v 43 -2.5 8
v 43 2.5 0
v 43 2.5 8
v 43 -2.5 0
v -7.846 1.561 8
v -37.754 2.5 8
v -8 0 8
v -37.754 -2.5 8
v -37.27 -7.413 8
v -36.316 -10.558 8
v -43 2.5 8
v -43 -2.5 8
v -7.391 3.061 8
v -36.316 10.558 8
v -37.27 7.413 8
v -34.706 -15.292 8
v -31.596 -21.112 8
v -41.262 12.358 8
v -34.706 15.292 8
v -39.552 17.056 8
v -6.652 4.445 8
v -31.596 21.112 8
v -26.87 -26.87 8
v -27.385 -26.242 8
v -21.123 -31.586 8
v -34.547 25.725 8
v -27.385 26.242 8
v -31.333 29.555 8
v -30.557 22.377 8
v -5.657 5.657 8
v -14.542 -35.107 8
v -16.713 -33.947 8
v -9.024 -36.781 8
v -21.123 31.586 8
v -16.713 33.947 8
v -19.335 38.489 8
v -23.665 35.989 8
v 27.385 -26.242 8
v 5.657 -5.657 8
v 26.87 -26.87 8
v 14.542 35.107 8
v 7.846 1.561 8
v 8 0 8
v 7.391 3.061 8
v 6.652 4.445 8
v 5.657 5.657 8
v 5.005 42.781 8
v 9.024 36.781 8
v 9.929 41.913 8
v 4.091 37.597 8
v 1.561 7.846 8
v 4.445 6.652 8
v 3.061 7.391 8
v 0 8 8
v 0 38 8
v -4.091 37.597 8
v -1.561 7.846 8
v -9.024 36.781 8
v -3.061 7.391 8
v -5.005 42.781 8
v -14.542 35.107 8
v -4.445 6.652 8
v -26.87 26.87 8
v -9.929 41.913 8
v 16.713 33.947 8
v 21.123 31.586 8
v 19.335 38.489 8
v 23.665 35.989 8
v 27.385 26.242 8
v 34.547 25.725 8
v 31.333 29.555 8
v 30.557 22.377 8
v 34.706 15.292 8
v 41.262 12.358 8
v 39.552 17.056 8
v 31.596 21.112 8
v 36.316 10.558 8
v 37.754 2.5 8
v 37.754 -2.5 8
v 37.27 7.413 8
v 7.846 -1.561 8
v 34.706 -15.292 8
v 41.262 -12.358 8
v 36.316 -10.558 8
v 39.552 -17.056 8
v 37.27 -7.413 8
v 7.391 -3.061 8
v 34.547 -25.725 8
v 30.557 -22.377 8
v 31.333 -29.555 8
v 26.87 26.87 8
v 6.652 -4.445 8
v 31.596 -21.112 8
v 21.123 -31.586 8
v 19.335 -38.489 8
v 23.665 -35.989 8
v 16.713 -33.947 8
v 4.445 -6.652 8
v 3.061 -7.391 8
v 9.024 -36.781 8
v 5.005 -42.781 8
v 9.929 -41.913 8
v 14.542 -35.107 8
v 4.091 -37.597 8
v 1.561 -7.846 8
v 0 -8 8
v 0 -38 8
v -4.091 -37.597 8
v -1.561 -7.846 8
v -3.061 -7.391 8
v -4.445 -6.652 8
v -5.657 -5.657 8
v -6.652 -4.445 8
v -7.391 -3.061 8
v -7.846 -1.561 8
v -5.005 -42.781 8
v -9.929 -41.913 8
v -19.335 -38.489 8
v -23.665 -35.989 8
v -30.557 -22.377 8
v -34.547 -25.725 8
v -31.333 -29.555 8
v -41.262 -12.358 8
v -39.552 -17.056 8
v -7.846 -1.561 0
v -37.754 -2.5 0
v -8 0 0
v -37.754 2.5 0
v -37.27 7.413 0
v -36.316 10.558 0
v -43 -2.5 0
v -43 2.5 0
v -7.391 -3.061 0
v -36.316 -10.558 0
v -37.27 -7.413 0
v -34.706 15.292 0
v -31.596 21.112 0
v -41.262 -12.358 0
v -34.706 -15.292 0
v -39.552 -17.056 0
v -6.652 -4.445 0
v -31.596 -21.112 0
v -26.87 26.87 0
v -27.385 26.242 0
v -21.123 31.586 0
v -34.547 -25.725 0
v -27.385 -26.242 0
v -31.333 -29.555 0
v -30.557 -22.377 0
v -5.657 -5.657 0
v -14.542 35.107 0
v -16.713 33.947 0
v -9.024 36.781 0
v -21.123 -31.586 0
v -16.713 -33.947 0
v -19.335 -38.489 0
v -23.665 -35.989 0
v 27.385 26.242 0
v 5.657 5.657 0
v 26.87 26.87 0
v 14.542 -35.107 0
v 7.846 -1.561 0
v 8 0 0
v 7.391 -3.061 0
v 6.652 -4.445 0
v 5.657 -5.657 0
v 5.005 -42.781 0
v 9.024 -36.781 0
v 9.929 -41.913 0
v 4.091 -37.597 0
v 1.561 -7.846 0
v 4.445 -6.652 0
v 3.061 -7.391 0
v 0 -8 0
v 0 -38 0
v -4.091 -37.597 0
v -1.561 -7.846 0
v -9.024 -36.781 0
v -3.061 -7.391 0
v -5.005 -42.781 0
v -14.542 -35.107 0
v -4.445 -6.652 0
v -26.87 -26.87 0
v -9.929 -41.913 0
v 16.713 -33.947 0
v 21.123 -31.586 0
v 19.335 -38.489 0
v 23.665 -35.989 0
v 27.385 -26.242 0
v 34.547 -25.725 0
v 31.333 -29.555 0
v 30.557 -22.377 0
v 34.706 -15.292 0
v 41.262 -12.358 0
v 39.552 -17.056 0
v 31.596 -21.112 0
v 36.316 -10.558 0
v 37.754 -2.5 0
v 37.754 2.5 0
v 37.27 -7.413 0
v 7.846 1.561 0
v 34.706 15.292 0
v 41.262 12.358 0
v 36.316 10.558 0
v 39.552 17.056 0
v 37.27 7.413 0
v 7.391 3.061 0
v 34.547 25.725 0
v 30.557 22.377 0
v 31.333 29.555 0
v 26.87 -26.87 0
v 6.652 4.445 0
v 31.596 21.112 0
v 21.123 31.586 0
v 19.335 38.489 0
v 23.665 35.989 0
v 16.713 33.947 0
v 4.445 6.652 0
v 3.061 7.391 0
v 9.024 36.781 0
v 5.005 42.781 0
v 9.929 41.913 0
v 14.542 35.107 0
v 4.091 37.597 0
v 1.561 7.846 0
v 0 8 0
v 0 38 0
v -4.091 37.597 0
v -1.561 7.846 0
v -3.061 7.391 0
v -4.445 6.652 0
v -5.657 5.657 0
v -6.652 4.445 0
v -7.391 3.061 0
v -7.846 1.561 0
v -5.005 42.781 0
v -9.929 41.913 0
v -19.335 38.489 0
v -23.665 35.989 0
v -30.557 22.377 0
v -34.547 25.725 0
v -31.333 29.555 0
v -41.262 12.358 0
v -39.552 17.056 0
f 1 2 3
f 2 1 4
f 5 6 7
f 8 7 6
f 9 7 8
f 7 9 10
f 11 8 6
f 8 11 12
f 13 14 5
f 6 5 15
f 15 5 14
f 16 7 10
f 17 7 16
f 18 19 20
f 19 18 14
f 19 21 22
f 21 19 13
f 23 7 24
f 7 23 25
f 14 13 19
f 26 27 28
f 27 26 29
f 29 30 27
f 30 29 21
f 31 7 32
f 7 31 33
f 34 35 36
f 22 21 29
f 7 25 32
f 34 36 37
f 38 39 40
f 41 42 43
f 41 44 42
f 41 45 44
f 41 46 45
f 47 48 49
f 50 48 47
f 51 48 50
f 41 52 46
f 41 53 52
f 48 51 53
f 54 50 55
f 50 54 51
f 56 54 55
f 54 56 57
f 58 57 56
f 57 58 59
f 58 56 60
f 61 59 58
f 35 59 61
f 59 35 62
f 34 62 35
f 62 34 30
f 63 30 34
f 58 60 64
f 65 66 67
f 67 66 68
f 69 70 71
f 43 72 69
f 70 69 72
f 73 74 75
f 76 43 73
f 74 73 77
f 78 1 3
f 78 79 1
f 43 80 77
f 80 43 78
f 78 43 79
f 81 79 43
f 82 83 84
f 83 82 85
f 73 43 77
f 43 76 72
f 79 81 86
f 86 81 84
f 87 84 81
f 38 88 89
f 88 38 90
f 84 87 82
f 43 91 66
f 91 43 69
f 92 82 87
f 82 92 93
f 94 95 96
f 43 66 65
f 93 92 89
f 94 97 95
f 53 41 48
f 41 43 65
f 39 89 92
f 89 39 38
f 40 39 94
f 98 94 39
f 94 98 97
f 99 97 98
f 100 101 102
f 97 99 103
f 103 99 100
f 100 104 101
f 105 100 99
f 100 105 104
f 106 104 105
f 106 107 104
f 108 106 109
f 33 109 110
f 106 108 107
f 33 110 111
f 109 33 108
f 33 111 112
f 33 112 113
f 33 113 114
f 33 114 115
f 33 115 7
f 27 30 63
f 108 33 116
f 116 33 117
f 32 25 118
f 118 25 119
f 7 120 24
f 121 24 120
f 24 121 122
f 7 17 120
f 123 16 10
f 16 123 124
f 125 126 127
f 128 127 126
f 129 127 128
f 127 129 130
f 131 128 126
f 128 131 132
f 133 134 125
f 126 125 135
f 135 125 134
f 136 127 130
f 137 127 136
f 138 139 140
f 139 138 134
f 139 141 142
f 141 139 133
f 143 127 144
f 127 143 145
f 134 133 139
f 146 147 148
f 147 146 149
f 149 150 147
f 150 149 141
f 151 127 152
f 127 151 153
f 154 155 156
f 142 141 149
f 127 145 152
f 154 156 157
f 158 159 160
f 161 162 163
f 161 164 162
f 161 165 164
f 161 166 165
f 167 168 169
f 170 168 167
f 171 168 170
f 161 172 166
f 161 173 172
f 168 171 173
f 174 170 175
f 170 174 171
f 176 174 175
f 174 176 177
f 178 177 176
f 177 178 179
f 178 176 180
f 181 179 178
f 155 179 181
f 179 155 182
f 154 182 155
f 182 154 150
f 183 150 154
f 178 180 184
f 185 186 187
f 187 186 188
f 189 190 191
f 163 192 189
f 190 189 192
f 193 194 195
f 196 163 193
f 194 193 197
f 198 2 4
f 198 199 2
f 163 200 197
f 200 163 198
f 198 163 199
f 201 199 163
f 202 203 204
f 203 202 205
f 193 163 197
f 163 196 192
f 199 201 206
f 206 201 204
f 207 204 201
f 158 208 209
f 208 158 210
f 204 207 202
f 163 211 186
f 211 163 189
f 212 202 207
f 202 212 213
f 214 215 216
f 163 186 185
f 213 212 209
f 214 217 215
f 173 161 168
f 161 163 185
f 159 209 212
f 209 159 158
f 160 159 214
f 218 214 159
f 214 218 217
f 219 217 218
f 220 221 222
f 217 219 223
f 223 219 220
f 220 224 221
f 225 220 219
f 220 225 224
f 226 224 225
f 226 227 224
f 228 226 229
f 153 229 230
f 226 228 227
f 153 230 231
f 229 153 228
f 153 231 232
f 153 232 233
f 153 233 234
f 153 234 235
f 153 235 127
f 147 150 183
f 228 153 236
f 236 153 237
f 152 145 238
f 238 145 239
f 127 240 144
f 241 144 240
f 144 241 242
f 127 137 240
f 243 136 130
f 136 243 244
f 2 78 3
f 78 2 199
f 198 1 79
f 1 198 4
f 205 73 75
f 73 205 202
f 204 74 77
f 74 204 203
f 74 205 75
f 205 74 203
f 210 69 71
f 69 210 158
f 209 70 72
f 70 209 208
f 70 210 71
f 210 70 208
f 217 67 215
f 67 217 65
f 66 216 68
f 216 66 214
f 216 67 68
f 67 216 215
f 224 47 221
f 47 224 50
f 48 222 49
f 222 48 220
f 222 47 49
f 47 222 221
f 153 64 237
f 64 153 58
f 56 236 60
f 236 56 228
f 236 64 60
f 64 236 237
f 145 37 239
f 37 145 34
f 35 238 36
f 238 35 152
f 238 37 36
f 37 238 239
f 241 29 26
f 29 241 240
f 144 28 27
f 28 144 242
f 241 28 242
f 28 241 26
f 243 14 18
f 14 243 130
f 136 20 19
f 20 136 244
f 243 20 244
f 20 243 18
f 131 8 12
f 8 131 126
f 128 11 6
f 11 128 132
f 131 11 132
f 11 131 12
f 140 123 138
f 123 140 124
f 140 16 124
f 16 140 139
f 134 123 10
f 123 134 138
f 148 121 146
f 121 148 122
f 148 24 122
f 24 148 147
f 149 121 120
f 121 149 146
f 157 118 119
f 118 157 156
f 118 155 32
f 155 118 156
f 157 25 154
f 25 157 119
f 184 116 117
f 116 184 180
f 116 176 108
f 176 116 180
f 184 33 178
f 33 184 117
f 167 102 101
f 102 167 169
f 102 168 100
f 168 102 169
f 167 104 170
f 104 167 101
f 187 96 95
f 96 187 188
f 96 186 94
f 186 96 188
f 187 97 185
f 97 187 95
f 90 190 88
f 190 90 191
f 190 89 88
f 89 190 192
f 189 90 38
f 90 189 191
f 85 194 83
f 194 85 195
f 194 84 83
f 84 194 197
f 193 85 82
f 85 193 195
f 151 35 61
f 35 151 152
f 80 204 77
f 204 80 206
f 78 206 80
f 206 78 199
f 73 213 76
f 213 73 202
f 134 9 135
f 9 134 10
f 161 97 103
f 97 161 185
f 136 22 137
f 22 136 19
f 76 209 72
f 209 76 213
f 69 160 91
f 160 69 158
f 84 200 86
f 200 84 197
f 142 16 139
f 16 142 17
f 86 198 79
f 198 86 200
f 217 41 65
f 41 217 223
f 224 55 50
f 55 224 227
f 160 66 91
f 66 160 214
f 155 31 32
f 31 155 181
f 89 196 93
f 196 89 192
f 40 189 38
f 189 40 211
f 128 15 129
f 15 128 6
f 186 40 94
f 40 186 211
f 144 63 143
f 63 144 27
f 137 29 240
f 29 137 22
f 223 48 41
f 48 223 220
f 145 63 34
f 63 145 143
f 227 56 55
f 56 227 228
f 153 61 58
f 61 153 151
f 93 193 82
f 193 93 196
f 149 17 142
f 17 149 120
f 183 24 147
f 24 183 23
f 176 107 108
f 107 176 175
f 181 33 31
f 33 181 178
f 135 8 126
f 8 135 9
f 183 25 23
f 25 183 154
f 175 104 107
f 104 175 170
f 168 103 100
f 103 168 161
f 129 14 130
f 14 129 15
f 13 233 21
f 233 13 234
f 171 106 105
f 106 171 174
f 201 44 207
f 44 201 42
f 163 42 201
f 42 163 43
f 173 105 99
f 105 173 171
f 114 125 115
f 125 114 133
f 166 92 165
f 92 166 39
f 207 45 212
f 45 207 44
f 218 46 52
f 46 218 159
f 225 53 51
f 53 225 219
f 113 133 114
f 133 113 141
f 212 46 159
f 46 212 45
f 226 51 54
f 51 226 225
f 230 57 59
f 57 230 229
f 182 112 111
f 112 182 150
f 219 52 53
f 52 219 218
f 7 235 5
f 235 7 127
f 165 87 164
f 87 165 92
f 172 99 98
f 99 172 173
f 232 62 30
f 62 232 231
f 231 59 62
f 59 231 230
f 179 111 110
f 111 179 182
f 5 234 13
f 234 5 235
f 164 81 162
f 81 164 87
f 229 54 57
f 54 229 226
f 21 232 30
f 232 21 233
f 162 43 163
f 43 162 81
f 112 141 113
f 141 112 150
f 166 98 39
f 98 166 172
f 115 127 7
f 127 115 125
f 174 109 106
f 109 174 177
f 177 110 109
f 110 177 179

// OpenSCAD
$fn = 32;

// ----------------------------------------------------------------------
// Spur blank: bored gear blank
// ----------------------------------------------------------------------

// --- parameters (mm) ---
disc_r = 38;              // blank root radius
disc_t = 8;               // blank thickness
n_teeth = 18;             // stub tooth count
tooth_w = 5;              // tooth width at the root
tooth_h = 5;              // tooth height above the root
bore_r = 8;               // central bore radius
fit_tol = 0.05;           // tolerance for press fits, mm
free_tol = 0.3;           // tolerance for clearance fits, mm

out_r = disc_r + tooth_h;  // tip radius
bbox_x = 86.0;  // measured width over the teeth
bbox_y = 85.56;  // measured depth over the teeth

difference() {
union() {
  cylinder(r = disc_r, h = disc_t);
  for (i = [0 : n_teeth - 1])
    rotate([0, 0, i * 360 / n_teeth])
      translate([disc_r - 1, -tooth_w / 2, 0])
        cube([tooth_h + 1, tooth_w, disc_t]);
}
  translate([0, 0, -1]) cylinder(r = bore_r, h = disc_t + 2);
}
